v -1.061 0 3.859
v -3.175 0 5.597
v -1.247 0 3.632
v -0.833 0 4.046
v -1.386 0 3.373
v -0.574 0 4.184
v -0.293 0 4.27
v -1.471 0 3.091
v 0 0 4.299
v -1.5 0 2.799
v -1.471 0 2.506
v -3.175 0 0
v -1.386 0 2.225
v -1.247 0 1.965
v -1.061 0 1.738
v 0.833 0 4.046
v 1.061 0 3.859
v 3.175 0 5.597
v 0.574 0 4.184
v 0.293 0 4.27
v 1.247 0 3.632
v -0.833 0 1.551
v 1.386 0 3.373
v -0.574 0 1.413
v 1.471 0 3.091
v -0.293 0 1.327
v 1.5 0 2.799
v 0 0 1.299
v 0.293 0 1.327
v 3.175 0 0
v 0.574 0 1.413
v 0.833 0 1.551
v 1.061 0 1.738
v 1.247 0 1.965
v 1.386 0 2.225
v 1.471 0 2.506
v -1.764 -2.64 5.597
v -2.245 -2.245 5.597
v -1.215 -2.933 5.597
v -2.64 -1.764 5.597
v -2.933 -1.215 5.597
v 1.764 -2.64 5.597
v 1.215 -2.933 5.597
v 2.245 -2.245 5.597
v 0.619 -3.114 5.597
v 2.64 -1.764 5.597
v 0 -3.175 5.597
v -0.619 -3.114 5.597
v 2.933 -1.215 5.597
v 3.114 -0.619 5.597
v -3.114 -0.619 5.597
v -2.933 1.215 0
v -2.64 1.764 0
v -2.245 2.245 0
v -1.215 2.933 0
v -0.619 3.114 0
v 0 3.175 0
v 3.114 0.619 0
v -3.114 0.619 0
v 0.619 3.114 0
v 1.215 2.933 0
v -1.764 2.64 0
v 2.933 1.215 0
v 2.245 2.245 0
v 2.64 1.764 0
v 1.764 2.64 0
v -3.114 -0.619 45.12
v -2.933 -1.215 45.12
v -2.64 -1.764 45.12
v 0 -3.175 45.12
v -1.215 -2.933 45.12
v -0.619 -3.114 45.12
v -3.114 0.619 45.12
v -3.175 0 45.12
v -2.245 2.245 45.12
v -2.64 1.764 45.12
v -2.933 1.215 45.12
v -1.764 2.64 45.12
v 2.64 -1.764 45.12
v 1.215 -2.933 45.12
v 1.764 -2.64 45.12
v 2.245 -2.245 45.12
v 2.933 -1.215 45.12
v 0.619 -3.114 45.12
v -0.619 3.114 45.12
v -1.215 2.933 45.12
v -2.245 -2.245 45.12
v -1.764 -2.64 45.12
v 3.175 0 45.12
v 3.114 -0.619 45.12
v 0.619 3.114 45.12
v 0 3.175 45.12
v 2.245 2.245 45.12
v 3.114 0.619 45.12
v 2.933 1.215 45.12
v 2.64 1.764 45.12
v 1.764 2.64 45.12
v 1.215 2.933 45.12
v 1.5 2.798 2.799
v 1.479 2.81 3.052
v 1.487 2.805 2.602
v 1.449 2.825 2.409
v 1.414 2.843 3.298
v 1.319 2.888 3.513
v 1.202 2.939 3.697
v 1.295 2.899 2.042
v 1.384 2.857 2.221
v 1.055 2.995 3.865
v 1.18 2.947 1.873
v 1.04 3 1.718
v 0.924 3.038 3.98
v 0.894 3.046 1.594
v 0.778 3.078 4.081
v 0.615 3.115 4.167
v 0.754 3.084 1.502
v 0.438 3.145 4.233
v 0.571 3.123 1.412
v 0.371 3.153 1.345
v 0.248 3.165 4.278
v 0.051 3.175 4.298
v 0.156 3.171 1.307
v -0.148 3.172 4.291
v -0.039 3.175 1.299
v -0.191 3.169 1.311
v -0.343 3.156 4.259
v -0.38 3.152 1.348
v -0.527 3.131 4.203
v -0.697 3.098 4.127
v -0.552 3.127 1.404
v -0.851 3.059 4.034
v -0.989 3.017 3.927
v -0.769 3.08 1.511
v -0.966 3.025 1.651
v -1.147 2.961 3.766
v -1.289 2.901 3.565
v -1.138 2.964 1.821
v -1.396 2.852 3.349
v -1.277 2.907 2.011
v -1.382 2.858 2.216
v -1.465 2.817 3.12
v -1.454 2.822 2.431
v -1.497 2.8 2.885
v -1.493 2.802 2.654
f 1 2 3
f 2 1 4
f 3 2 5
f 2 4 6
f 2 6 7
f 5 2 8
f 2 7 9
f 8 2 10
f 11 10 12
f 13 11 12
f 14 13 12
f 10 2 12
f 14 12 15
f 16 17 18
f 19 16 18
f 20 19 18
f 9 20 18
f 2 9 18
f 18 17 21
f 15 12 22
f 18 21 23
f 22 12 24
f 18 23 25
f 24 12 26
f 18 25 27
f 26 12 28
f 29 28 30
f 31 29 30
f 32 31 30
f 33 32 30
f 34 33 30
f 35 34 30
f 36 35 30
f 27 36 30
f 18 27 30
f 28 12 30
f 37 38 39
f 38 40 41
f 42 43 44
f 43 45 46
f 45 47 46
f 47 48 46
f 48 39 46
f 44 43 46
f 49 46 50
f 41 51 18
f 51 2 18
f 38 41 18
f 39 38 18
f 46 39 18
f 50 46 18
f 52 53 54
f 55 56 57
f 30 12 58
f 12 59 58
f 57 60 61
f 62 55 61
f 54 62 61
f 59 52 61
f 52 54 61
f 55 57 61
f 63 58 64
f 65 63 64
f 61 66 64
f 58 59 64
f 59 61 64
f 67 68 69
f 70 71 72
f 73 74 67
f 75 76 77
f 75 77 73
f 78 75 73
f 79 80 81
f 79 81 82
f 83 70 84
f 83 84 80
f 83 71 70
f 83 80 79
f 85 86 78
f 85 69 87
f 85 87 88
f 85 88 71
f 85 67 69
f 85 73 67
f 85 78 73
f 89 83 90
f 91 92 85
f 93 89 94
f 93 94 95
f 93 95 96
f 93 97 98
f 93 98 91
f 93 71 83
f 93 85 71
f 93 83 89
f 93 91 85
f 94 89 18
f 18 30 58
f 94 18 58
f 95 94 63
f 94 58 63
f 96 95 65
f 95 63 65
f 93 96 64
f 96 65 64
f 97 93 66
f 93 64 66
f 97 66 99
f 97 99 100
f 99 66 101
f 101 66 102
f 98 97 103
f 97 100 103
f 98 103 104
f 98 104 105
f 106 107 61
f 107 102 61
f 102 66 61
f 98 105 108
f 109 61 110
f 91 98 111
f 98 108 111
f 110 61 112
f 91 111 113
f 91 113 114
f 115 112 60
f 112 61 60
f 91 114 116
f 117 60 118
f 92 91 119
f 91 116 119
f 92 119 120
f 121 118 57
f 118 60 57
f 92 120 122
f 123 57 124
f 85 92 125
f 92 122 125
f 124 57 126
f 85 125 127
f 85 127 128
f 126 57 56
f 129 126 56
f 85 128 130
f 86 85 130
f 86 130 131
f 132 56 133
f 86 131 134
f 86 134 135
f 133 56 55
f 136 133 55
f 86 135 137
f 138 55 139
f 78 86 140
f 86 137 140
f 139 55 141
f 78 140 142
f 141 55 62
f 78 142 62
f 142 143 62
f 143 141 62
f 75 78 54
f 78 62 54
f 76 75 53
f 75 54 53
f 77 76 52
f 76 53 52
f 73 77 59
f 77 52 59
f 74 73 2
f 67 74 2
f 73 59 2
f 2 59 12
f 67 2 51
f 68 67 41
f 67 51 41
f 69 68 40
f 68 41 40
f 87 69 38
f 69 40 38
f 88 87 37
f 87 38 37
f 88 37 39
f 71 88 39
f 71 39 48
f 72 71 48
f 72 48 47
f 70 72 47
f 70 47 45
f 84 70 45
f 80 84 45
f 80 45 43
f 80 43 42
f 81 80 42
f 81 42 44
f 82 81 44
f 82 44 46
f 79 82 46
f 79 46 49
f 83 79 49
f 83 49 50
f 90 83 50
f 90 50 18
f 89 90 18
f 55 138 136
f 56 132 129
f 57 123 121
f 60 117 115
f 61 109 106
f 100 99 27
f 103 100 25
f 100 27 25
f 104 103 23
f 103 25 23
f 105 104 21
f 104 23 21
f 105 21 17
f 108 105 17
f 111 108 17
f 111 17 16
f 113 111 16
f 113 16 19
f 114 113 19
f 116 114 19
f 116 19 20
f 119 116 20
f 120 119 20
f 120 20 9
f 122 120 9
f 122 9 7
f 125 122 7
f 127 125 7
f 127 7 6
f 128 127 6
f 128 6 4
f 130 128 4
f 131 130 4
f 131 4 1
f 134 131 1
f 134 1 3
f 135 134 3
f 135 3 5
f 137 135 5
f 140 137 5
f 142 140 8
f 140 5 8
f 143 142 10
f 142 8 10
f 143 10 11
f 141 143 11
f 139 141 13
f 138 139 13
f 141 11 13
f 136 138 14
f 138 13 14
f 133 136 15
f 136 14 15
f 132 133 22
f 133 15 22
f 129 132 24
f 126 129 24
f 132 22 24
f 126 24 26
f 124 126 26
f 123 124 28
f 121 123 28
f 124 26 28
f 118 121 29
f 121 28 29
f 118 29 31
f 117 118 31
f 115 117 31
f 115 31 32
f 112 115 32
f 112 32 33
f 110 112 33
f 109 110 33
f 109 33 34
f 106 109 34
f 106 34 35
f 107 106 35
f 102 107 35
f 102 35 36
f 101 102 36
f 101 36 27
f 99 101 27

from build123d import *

# Parameters (mm, degrees)
SKETCH1_R           = 3.175
BOSS_EXTRUDE1_DEPTH = 45.12
SKETCH2_W           = 6.35
SKETCH2_H           = 5.59727822
CUT_EXTRUDE1_DEPTH  = 7
SKETCH3_R           = 1.5
CUT_EXTRUDE2_DEPTH  = 7


with BuildPart() as part:
    # Sketch1 → Boss-Extrude1 (new body)
    with BuildSketch(Plane.XY):
        Circle(SKETCH1_R)
    extrude(amount=BOSS_EXTRUDE1_DEPTH)

    # Sketch2 → Cut-Extrude1 (cut)
    with BuildSketch(Plane(origin=(0, 0, 0), x_dir=(1, 0, 0), z_dir=(0, 1, 0))):
        with Locations((0, -2.79863911)):
            Rectangle(SKETCH2_W, SKETCH2_H)
    extrude(amount=-CUT_EXTRUDE1_DEPTH, mode=Mode.SUBTRACT)

    # Sketch3 → Cut-Extrude2 (cut)
    with BuildSketch(Plane.XZ):
        with Locations((0, 2.79863911)):
            Circle(SKETCH3_R)
    extrude(amount=-CUT_EXTRUDE2_DEPTH, mode=Mode.SUBTRACT)


solid = part.part
